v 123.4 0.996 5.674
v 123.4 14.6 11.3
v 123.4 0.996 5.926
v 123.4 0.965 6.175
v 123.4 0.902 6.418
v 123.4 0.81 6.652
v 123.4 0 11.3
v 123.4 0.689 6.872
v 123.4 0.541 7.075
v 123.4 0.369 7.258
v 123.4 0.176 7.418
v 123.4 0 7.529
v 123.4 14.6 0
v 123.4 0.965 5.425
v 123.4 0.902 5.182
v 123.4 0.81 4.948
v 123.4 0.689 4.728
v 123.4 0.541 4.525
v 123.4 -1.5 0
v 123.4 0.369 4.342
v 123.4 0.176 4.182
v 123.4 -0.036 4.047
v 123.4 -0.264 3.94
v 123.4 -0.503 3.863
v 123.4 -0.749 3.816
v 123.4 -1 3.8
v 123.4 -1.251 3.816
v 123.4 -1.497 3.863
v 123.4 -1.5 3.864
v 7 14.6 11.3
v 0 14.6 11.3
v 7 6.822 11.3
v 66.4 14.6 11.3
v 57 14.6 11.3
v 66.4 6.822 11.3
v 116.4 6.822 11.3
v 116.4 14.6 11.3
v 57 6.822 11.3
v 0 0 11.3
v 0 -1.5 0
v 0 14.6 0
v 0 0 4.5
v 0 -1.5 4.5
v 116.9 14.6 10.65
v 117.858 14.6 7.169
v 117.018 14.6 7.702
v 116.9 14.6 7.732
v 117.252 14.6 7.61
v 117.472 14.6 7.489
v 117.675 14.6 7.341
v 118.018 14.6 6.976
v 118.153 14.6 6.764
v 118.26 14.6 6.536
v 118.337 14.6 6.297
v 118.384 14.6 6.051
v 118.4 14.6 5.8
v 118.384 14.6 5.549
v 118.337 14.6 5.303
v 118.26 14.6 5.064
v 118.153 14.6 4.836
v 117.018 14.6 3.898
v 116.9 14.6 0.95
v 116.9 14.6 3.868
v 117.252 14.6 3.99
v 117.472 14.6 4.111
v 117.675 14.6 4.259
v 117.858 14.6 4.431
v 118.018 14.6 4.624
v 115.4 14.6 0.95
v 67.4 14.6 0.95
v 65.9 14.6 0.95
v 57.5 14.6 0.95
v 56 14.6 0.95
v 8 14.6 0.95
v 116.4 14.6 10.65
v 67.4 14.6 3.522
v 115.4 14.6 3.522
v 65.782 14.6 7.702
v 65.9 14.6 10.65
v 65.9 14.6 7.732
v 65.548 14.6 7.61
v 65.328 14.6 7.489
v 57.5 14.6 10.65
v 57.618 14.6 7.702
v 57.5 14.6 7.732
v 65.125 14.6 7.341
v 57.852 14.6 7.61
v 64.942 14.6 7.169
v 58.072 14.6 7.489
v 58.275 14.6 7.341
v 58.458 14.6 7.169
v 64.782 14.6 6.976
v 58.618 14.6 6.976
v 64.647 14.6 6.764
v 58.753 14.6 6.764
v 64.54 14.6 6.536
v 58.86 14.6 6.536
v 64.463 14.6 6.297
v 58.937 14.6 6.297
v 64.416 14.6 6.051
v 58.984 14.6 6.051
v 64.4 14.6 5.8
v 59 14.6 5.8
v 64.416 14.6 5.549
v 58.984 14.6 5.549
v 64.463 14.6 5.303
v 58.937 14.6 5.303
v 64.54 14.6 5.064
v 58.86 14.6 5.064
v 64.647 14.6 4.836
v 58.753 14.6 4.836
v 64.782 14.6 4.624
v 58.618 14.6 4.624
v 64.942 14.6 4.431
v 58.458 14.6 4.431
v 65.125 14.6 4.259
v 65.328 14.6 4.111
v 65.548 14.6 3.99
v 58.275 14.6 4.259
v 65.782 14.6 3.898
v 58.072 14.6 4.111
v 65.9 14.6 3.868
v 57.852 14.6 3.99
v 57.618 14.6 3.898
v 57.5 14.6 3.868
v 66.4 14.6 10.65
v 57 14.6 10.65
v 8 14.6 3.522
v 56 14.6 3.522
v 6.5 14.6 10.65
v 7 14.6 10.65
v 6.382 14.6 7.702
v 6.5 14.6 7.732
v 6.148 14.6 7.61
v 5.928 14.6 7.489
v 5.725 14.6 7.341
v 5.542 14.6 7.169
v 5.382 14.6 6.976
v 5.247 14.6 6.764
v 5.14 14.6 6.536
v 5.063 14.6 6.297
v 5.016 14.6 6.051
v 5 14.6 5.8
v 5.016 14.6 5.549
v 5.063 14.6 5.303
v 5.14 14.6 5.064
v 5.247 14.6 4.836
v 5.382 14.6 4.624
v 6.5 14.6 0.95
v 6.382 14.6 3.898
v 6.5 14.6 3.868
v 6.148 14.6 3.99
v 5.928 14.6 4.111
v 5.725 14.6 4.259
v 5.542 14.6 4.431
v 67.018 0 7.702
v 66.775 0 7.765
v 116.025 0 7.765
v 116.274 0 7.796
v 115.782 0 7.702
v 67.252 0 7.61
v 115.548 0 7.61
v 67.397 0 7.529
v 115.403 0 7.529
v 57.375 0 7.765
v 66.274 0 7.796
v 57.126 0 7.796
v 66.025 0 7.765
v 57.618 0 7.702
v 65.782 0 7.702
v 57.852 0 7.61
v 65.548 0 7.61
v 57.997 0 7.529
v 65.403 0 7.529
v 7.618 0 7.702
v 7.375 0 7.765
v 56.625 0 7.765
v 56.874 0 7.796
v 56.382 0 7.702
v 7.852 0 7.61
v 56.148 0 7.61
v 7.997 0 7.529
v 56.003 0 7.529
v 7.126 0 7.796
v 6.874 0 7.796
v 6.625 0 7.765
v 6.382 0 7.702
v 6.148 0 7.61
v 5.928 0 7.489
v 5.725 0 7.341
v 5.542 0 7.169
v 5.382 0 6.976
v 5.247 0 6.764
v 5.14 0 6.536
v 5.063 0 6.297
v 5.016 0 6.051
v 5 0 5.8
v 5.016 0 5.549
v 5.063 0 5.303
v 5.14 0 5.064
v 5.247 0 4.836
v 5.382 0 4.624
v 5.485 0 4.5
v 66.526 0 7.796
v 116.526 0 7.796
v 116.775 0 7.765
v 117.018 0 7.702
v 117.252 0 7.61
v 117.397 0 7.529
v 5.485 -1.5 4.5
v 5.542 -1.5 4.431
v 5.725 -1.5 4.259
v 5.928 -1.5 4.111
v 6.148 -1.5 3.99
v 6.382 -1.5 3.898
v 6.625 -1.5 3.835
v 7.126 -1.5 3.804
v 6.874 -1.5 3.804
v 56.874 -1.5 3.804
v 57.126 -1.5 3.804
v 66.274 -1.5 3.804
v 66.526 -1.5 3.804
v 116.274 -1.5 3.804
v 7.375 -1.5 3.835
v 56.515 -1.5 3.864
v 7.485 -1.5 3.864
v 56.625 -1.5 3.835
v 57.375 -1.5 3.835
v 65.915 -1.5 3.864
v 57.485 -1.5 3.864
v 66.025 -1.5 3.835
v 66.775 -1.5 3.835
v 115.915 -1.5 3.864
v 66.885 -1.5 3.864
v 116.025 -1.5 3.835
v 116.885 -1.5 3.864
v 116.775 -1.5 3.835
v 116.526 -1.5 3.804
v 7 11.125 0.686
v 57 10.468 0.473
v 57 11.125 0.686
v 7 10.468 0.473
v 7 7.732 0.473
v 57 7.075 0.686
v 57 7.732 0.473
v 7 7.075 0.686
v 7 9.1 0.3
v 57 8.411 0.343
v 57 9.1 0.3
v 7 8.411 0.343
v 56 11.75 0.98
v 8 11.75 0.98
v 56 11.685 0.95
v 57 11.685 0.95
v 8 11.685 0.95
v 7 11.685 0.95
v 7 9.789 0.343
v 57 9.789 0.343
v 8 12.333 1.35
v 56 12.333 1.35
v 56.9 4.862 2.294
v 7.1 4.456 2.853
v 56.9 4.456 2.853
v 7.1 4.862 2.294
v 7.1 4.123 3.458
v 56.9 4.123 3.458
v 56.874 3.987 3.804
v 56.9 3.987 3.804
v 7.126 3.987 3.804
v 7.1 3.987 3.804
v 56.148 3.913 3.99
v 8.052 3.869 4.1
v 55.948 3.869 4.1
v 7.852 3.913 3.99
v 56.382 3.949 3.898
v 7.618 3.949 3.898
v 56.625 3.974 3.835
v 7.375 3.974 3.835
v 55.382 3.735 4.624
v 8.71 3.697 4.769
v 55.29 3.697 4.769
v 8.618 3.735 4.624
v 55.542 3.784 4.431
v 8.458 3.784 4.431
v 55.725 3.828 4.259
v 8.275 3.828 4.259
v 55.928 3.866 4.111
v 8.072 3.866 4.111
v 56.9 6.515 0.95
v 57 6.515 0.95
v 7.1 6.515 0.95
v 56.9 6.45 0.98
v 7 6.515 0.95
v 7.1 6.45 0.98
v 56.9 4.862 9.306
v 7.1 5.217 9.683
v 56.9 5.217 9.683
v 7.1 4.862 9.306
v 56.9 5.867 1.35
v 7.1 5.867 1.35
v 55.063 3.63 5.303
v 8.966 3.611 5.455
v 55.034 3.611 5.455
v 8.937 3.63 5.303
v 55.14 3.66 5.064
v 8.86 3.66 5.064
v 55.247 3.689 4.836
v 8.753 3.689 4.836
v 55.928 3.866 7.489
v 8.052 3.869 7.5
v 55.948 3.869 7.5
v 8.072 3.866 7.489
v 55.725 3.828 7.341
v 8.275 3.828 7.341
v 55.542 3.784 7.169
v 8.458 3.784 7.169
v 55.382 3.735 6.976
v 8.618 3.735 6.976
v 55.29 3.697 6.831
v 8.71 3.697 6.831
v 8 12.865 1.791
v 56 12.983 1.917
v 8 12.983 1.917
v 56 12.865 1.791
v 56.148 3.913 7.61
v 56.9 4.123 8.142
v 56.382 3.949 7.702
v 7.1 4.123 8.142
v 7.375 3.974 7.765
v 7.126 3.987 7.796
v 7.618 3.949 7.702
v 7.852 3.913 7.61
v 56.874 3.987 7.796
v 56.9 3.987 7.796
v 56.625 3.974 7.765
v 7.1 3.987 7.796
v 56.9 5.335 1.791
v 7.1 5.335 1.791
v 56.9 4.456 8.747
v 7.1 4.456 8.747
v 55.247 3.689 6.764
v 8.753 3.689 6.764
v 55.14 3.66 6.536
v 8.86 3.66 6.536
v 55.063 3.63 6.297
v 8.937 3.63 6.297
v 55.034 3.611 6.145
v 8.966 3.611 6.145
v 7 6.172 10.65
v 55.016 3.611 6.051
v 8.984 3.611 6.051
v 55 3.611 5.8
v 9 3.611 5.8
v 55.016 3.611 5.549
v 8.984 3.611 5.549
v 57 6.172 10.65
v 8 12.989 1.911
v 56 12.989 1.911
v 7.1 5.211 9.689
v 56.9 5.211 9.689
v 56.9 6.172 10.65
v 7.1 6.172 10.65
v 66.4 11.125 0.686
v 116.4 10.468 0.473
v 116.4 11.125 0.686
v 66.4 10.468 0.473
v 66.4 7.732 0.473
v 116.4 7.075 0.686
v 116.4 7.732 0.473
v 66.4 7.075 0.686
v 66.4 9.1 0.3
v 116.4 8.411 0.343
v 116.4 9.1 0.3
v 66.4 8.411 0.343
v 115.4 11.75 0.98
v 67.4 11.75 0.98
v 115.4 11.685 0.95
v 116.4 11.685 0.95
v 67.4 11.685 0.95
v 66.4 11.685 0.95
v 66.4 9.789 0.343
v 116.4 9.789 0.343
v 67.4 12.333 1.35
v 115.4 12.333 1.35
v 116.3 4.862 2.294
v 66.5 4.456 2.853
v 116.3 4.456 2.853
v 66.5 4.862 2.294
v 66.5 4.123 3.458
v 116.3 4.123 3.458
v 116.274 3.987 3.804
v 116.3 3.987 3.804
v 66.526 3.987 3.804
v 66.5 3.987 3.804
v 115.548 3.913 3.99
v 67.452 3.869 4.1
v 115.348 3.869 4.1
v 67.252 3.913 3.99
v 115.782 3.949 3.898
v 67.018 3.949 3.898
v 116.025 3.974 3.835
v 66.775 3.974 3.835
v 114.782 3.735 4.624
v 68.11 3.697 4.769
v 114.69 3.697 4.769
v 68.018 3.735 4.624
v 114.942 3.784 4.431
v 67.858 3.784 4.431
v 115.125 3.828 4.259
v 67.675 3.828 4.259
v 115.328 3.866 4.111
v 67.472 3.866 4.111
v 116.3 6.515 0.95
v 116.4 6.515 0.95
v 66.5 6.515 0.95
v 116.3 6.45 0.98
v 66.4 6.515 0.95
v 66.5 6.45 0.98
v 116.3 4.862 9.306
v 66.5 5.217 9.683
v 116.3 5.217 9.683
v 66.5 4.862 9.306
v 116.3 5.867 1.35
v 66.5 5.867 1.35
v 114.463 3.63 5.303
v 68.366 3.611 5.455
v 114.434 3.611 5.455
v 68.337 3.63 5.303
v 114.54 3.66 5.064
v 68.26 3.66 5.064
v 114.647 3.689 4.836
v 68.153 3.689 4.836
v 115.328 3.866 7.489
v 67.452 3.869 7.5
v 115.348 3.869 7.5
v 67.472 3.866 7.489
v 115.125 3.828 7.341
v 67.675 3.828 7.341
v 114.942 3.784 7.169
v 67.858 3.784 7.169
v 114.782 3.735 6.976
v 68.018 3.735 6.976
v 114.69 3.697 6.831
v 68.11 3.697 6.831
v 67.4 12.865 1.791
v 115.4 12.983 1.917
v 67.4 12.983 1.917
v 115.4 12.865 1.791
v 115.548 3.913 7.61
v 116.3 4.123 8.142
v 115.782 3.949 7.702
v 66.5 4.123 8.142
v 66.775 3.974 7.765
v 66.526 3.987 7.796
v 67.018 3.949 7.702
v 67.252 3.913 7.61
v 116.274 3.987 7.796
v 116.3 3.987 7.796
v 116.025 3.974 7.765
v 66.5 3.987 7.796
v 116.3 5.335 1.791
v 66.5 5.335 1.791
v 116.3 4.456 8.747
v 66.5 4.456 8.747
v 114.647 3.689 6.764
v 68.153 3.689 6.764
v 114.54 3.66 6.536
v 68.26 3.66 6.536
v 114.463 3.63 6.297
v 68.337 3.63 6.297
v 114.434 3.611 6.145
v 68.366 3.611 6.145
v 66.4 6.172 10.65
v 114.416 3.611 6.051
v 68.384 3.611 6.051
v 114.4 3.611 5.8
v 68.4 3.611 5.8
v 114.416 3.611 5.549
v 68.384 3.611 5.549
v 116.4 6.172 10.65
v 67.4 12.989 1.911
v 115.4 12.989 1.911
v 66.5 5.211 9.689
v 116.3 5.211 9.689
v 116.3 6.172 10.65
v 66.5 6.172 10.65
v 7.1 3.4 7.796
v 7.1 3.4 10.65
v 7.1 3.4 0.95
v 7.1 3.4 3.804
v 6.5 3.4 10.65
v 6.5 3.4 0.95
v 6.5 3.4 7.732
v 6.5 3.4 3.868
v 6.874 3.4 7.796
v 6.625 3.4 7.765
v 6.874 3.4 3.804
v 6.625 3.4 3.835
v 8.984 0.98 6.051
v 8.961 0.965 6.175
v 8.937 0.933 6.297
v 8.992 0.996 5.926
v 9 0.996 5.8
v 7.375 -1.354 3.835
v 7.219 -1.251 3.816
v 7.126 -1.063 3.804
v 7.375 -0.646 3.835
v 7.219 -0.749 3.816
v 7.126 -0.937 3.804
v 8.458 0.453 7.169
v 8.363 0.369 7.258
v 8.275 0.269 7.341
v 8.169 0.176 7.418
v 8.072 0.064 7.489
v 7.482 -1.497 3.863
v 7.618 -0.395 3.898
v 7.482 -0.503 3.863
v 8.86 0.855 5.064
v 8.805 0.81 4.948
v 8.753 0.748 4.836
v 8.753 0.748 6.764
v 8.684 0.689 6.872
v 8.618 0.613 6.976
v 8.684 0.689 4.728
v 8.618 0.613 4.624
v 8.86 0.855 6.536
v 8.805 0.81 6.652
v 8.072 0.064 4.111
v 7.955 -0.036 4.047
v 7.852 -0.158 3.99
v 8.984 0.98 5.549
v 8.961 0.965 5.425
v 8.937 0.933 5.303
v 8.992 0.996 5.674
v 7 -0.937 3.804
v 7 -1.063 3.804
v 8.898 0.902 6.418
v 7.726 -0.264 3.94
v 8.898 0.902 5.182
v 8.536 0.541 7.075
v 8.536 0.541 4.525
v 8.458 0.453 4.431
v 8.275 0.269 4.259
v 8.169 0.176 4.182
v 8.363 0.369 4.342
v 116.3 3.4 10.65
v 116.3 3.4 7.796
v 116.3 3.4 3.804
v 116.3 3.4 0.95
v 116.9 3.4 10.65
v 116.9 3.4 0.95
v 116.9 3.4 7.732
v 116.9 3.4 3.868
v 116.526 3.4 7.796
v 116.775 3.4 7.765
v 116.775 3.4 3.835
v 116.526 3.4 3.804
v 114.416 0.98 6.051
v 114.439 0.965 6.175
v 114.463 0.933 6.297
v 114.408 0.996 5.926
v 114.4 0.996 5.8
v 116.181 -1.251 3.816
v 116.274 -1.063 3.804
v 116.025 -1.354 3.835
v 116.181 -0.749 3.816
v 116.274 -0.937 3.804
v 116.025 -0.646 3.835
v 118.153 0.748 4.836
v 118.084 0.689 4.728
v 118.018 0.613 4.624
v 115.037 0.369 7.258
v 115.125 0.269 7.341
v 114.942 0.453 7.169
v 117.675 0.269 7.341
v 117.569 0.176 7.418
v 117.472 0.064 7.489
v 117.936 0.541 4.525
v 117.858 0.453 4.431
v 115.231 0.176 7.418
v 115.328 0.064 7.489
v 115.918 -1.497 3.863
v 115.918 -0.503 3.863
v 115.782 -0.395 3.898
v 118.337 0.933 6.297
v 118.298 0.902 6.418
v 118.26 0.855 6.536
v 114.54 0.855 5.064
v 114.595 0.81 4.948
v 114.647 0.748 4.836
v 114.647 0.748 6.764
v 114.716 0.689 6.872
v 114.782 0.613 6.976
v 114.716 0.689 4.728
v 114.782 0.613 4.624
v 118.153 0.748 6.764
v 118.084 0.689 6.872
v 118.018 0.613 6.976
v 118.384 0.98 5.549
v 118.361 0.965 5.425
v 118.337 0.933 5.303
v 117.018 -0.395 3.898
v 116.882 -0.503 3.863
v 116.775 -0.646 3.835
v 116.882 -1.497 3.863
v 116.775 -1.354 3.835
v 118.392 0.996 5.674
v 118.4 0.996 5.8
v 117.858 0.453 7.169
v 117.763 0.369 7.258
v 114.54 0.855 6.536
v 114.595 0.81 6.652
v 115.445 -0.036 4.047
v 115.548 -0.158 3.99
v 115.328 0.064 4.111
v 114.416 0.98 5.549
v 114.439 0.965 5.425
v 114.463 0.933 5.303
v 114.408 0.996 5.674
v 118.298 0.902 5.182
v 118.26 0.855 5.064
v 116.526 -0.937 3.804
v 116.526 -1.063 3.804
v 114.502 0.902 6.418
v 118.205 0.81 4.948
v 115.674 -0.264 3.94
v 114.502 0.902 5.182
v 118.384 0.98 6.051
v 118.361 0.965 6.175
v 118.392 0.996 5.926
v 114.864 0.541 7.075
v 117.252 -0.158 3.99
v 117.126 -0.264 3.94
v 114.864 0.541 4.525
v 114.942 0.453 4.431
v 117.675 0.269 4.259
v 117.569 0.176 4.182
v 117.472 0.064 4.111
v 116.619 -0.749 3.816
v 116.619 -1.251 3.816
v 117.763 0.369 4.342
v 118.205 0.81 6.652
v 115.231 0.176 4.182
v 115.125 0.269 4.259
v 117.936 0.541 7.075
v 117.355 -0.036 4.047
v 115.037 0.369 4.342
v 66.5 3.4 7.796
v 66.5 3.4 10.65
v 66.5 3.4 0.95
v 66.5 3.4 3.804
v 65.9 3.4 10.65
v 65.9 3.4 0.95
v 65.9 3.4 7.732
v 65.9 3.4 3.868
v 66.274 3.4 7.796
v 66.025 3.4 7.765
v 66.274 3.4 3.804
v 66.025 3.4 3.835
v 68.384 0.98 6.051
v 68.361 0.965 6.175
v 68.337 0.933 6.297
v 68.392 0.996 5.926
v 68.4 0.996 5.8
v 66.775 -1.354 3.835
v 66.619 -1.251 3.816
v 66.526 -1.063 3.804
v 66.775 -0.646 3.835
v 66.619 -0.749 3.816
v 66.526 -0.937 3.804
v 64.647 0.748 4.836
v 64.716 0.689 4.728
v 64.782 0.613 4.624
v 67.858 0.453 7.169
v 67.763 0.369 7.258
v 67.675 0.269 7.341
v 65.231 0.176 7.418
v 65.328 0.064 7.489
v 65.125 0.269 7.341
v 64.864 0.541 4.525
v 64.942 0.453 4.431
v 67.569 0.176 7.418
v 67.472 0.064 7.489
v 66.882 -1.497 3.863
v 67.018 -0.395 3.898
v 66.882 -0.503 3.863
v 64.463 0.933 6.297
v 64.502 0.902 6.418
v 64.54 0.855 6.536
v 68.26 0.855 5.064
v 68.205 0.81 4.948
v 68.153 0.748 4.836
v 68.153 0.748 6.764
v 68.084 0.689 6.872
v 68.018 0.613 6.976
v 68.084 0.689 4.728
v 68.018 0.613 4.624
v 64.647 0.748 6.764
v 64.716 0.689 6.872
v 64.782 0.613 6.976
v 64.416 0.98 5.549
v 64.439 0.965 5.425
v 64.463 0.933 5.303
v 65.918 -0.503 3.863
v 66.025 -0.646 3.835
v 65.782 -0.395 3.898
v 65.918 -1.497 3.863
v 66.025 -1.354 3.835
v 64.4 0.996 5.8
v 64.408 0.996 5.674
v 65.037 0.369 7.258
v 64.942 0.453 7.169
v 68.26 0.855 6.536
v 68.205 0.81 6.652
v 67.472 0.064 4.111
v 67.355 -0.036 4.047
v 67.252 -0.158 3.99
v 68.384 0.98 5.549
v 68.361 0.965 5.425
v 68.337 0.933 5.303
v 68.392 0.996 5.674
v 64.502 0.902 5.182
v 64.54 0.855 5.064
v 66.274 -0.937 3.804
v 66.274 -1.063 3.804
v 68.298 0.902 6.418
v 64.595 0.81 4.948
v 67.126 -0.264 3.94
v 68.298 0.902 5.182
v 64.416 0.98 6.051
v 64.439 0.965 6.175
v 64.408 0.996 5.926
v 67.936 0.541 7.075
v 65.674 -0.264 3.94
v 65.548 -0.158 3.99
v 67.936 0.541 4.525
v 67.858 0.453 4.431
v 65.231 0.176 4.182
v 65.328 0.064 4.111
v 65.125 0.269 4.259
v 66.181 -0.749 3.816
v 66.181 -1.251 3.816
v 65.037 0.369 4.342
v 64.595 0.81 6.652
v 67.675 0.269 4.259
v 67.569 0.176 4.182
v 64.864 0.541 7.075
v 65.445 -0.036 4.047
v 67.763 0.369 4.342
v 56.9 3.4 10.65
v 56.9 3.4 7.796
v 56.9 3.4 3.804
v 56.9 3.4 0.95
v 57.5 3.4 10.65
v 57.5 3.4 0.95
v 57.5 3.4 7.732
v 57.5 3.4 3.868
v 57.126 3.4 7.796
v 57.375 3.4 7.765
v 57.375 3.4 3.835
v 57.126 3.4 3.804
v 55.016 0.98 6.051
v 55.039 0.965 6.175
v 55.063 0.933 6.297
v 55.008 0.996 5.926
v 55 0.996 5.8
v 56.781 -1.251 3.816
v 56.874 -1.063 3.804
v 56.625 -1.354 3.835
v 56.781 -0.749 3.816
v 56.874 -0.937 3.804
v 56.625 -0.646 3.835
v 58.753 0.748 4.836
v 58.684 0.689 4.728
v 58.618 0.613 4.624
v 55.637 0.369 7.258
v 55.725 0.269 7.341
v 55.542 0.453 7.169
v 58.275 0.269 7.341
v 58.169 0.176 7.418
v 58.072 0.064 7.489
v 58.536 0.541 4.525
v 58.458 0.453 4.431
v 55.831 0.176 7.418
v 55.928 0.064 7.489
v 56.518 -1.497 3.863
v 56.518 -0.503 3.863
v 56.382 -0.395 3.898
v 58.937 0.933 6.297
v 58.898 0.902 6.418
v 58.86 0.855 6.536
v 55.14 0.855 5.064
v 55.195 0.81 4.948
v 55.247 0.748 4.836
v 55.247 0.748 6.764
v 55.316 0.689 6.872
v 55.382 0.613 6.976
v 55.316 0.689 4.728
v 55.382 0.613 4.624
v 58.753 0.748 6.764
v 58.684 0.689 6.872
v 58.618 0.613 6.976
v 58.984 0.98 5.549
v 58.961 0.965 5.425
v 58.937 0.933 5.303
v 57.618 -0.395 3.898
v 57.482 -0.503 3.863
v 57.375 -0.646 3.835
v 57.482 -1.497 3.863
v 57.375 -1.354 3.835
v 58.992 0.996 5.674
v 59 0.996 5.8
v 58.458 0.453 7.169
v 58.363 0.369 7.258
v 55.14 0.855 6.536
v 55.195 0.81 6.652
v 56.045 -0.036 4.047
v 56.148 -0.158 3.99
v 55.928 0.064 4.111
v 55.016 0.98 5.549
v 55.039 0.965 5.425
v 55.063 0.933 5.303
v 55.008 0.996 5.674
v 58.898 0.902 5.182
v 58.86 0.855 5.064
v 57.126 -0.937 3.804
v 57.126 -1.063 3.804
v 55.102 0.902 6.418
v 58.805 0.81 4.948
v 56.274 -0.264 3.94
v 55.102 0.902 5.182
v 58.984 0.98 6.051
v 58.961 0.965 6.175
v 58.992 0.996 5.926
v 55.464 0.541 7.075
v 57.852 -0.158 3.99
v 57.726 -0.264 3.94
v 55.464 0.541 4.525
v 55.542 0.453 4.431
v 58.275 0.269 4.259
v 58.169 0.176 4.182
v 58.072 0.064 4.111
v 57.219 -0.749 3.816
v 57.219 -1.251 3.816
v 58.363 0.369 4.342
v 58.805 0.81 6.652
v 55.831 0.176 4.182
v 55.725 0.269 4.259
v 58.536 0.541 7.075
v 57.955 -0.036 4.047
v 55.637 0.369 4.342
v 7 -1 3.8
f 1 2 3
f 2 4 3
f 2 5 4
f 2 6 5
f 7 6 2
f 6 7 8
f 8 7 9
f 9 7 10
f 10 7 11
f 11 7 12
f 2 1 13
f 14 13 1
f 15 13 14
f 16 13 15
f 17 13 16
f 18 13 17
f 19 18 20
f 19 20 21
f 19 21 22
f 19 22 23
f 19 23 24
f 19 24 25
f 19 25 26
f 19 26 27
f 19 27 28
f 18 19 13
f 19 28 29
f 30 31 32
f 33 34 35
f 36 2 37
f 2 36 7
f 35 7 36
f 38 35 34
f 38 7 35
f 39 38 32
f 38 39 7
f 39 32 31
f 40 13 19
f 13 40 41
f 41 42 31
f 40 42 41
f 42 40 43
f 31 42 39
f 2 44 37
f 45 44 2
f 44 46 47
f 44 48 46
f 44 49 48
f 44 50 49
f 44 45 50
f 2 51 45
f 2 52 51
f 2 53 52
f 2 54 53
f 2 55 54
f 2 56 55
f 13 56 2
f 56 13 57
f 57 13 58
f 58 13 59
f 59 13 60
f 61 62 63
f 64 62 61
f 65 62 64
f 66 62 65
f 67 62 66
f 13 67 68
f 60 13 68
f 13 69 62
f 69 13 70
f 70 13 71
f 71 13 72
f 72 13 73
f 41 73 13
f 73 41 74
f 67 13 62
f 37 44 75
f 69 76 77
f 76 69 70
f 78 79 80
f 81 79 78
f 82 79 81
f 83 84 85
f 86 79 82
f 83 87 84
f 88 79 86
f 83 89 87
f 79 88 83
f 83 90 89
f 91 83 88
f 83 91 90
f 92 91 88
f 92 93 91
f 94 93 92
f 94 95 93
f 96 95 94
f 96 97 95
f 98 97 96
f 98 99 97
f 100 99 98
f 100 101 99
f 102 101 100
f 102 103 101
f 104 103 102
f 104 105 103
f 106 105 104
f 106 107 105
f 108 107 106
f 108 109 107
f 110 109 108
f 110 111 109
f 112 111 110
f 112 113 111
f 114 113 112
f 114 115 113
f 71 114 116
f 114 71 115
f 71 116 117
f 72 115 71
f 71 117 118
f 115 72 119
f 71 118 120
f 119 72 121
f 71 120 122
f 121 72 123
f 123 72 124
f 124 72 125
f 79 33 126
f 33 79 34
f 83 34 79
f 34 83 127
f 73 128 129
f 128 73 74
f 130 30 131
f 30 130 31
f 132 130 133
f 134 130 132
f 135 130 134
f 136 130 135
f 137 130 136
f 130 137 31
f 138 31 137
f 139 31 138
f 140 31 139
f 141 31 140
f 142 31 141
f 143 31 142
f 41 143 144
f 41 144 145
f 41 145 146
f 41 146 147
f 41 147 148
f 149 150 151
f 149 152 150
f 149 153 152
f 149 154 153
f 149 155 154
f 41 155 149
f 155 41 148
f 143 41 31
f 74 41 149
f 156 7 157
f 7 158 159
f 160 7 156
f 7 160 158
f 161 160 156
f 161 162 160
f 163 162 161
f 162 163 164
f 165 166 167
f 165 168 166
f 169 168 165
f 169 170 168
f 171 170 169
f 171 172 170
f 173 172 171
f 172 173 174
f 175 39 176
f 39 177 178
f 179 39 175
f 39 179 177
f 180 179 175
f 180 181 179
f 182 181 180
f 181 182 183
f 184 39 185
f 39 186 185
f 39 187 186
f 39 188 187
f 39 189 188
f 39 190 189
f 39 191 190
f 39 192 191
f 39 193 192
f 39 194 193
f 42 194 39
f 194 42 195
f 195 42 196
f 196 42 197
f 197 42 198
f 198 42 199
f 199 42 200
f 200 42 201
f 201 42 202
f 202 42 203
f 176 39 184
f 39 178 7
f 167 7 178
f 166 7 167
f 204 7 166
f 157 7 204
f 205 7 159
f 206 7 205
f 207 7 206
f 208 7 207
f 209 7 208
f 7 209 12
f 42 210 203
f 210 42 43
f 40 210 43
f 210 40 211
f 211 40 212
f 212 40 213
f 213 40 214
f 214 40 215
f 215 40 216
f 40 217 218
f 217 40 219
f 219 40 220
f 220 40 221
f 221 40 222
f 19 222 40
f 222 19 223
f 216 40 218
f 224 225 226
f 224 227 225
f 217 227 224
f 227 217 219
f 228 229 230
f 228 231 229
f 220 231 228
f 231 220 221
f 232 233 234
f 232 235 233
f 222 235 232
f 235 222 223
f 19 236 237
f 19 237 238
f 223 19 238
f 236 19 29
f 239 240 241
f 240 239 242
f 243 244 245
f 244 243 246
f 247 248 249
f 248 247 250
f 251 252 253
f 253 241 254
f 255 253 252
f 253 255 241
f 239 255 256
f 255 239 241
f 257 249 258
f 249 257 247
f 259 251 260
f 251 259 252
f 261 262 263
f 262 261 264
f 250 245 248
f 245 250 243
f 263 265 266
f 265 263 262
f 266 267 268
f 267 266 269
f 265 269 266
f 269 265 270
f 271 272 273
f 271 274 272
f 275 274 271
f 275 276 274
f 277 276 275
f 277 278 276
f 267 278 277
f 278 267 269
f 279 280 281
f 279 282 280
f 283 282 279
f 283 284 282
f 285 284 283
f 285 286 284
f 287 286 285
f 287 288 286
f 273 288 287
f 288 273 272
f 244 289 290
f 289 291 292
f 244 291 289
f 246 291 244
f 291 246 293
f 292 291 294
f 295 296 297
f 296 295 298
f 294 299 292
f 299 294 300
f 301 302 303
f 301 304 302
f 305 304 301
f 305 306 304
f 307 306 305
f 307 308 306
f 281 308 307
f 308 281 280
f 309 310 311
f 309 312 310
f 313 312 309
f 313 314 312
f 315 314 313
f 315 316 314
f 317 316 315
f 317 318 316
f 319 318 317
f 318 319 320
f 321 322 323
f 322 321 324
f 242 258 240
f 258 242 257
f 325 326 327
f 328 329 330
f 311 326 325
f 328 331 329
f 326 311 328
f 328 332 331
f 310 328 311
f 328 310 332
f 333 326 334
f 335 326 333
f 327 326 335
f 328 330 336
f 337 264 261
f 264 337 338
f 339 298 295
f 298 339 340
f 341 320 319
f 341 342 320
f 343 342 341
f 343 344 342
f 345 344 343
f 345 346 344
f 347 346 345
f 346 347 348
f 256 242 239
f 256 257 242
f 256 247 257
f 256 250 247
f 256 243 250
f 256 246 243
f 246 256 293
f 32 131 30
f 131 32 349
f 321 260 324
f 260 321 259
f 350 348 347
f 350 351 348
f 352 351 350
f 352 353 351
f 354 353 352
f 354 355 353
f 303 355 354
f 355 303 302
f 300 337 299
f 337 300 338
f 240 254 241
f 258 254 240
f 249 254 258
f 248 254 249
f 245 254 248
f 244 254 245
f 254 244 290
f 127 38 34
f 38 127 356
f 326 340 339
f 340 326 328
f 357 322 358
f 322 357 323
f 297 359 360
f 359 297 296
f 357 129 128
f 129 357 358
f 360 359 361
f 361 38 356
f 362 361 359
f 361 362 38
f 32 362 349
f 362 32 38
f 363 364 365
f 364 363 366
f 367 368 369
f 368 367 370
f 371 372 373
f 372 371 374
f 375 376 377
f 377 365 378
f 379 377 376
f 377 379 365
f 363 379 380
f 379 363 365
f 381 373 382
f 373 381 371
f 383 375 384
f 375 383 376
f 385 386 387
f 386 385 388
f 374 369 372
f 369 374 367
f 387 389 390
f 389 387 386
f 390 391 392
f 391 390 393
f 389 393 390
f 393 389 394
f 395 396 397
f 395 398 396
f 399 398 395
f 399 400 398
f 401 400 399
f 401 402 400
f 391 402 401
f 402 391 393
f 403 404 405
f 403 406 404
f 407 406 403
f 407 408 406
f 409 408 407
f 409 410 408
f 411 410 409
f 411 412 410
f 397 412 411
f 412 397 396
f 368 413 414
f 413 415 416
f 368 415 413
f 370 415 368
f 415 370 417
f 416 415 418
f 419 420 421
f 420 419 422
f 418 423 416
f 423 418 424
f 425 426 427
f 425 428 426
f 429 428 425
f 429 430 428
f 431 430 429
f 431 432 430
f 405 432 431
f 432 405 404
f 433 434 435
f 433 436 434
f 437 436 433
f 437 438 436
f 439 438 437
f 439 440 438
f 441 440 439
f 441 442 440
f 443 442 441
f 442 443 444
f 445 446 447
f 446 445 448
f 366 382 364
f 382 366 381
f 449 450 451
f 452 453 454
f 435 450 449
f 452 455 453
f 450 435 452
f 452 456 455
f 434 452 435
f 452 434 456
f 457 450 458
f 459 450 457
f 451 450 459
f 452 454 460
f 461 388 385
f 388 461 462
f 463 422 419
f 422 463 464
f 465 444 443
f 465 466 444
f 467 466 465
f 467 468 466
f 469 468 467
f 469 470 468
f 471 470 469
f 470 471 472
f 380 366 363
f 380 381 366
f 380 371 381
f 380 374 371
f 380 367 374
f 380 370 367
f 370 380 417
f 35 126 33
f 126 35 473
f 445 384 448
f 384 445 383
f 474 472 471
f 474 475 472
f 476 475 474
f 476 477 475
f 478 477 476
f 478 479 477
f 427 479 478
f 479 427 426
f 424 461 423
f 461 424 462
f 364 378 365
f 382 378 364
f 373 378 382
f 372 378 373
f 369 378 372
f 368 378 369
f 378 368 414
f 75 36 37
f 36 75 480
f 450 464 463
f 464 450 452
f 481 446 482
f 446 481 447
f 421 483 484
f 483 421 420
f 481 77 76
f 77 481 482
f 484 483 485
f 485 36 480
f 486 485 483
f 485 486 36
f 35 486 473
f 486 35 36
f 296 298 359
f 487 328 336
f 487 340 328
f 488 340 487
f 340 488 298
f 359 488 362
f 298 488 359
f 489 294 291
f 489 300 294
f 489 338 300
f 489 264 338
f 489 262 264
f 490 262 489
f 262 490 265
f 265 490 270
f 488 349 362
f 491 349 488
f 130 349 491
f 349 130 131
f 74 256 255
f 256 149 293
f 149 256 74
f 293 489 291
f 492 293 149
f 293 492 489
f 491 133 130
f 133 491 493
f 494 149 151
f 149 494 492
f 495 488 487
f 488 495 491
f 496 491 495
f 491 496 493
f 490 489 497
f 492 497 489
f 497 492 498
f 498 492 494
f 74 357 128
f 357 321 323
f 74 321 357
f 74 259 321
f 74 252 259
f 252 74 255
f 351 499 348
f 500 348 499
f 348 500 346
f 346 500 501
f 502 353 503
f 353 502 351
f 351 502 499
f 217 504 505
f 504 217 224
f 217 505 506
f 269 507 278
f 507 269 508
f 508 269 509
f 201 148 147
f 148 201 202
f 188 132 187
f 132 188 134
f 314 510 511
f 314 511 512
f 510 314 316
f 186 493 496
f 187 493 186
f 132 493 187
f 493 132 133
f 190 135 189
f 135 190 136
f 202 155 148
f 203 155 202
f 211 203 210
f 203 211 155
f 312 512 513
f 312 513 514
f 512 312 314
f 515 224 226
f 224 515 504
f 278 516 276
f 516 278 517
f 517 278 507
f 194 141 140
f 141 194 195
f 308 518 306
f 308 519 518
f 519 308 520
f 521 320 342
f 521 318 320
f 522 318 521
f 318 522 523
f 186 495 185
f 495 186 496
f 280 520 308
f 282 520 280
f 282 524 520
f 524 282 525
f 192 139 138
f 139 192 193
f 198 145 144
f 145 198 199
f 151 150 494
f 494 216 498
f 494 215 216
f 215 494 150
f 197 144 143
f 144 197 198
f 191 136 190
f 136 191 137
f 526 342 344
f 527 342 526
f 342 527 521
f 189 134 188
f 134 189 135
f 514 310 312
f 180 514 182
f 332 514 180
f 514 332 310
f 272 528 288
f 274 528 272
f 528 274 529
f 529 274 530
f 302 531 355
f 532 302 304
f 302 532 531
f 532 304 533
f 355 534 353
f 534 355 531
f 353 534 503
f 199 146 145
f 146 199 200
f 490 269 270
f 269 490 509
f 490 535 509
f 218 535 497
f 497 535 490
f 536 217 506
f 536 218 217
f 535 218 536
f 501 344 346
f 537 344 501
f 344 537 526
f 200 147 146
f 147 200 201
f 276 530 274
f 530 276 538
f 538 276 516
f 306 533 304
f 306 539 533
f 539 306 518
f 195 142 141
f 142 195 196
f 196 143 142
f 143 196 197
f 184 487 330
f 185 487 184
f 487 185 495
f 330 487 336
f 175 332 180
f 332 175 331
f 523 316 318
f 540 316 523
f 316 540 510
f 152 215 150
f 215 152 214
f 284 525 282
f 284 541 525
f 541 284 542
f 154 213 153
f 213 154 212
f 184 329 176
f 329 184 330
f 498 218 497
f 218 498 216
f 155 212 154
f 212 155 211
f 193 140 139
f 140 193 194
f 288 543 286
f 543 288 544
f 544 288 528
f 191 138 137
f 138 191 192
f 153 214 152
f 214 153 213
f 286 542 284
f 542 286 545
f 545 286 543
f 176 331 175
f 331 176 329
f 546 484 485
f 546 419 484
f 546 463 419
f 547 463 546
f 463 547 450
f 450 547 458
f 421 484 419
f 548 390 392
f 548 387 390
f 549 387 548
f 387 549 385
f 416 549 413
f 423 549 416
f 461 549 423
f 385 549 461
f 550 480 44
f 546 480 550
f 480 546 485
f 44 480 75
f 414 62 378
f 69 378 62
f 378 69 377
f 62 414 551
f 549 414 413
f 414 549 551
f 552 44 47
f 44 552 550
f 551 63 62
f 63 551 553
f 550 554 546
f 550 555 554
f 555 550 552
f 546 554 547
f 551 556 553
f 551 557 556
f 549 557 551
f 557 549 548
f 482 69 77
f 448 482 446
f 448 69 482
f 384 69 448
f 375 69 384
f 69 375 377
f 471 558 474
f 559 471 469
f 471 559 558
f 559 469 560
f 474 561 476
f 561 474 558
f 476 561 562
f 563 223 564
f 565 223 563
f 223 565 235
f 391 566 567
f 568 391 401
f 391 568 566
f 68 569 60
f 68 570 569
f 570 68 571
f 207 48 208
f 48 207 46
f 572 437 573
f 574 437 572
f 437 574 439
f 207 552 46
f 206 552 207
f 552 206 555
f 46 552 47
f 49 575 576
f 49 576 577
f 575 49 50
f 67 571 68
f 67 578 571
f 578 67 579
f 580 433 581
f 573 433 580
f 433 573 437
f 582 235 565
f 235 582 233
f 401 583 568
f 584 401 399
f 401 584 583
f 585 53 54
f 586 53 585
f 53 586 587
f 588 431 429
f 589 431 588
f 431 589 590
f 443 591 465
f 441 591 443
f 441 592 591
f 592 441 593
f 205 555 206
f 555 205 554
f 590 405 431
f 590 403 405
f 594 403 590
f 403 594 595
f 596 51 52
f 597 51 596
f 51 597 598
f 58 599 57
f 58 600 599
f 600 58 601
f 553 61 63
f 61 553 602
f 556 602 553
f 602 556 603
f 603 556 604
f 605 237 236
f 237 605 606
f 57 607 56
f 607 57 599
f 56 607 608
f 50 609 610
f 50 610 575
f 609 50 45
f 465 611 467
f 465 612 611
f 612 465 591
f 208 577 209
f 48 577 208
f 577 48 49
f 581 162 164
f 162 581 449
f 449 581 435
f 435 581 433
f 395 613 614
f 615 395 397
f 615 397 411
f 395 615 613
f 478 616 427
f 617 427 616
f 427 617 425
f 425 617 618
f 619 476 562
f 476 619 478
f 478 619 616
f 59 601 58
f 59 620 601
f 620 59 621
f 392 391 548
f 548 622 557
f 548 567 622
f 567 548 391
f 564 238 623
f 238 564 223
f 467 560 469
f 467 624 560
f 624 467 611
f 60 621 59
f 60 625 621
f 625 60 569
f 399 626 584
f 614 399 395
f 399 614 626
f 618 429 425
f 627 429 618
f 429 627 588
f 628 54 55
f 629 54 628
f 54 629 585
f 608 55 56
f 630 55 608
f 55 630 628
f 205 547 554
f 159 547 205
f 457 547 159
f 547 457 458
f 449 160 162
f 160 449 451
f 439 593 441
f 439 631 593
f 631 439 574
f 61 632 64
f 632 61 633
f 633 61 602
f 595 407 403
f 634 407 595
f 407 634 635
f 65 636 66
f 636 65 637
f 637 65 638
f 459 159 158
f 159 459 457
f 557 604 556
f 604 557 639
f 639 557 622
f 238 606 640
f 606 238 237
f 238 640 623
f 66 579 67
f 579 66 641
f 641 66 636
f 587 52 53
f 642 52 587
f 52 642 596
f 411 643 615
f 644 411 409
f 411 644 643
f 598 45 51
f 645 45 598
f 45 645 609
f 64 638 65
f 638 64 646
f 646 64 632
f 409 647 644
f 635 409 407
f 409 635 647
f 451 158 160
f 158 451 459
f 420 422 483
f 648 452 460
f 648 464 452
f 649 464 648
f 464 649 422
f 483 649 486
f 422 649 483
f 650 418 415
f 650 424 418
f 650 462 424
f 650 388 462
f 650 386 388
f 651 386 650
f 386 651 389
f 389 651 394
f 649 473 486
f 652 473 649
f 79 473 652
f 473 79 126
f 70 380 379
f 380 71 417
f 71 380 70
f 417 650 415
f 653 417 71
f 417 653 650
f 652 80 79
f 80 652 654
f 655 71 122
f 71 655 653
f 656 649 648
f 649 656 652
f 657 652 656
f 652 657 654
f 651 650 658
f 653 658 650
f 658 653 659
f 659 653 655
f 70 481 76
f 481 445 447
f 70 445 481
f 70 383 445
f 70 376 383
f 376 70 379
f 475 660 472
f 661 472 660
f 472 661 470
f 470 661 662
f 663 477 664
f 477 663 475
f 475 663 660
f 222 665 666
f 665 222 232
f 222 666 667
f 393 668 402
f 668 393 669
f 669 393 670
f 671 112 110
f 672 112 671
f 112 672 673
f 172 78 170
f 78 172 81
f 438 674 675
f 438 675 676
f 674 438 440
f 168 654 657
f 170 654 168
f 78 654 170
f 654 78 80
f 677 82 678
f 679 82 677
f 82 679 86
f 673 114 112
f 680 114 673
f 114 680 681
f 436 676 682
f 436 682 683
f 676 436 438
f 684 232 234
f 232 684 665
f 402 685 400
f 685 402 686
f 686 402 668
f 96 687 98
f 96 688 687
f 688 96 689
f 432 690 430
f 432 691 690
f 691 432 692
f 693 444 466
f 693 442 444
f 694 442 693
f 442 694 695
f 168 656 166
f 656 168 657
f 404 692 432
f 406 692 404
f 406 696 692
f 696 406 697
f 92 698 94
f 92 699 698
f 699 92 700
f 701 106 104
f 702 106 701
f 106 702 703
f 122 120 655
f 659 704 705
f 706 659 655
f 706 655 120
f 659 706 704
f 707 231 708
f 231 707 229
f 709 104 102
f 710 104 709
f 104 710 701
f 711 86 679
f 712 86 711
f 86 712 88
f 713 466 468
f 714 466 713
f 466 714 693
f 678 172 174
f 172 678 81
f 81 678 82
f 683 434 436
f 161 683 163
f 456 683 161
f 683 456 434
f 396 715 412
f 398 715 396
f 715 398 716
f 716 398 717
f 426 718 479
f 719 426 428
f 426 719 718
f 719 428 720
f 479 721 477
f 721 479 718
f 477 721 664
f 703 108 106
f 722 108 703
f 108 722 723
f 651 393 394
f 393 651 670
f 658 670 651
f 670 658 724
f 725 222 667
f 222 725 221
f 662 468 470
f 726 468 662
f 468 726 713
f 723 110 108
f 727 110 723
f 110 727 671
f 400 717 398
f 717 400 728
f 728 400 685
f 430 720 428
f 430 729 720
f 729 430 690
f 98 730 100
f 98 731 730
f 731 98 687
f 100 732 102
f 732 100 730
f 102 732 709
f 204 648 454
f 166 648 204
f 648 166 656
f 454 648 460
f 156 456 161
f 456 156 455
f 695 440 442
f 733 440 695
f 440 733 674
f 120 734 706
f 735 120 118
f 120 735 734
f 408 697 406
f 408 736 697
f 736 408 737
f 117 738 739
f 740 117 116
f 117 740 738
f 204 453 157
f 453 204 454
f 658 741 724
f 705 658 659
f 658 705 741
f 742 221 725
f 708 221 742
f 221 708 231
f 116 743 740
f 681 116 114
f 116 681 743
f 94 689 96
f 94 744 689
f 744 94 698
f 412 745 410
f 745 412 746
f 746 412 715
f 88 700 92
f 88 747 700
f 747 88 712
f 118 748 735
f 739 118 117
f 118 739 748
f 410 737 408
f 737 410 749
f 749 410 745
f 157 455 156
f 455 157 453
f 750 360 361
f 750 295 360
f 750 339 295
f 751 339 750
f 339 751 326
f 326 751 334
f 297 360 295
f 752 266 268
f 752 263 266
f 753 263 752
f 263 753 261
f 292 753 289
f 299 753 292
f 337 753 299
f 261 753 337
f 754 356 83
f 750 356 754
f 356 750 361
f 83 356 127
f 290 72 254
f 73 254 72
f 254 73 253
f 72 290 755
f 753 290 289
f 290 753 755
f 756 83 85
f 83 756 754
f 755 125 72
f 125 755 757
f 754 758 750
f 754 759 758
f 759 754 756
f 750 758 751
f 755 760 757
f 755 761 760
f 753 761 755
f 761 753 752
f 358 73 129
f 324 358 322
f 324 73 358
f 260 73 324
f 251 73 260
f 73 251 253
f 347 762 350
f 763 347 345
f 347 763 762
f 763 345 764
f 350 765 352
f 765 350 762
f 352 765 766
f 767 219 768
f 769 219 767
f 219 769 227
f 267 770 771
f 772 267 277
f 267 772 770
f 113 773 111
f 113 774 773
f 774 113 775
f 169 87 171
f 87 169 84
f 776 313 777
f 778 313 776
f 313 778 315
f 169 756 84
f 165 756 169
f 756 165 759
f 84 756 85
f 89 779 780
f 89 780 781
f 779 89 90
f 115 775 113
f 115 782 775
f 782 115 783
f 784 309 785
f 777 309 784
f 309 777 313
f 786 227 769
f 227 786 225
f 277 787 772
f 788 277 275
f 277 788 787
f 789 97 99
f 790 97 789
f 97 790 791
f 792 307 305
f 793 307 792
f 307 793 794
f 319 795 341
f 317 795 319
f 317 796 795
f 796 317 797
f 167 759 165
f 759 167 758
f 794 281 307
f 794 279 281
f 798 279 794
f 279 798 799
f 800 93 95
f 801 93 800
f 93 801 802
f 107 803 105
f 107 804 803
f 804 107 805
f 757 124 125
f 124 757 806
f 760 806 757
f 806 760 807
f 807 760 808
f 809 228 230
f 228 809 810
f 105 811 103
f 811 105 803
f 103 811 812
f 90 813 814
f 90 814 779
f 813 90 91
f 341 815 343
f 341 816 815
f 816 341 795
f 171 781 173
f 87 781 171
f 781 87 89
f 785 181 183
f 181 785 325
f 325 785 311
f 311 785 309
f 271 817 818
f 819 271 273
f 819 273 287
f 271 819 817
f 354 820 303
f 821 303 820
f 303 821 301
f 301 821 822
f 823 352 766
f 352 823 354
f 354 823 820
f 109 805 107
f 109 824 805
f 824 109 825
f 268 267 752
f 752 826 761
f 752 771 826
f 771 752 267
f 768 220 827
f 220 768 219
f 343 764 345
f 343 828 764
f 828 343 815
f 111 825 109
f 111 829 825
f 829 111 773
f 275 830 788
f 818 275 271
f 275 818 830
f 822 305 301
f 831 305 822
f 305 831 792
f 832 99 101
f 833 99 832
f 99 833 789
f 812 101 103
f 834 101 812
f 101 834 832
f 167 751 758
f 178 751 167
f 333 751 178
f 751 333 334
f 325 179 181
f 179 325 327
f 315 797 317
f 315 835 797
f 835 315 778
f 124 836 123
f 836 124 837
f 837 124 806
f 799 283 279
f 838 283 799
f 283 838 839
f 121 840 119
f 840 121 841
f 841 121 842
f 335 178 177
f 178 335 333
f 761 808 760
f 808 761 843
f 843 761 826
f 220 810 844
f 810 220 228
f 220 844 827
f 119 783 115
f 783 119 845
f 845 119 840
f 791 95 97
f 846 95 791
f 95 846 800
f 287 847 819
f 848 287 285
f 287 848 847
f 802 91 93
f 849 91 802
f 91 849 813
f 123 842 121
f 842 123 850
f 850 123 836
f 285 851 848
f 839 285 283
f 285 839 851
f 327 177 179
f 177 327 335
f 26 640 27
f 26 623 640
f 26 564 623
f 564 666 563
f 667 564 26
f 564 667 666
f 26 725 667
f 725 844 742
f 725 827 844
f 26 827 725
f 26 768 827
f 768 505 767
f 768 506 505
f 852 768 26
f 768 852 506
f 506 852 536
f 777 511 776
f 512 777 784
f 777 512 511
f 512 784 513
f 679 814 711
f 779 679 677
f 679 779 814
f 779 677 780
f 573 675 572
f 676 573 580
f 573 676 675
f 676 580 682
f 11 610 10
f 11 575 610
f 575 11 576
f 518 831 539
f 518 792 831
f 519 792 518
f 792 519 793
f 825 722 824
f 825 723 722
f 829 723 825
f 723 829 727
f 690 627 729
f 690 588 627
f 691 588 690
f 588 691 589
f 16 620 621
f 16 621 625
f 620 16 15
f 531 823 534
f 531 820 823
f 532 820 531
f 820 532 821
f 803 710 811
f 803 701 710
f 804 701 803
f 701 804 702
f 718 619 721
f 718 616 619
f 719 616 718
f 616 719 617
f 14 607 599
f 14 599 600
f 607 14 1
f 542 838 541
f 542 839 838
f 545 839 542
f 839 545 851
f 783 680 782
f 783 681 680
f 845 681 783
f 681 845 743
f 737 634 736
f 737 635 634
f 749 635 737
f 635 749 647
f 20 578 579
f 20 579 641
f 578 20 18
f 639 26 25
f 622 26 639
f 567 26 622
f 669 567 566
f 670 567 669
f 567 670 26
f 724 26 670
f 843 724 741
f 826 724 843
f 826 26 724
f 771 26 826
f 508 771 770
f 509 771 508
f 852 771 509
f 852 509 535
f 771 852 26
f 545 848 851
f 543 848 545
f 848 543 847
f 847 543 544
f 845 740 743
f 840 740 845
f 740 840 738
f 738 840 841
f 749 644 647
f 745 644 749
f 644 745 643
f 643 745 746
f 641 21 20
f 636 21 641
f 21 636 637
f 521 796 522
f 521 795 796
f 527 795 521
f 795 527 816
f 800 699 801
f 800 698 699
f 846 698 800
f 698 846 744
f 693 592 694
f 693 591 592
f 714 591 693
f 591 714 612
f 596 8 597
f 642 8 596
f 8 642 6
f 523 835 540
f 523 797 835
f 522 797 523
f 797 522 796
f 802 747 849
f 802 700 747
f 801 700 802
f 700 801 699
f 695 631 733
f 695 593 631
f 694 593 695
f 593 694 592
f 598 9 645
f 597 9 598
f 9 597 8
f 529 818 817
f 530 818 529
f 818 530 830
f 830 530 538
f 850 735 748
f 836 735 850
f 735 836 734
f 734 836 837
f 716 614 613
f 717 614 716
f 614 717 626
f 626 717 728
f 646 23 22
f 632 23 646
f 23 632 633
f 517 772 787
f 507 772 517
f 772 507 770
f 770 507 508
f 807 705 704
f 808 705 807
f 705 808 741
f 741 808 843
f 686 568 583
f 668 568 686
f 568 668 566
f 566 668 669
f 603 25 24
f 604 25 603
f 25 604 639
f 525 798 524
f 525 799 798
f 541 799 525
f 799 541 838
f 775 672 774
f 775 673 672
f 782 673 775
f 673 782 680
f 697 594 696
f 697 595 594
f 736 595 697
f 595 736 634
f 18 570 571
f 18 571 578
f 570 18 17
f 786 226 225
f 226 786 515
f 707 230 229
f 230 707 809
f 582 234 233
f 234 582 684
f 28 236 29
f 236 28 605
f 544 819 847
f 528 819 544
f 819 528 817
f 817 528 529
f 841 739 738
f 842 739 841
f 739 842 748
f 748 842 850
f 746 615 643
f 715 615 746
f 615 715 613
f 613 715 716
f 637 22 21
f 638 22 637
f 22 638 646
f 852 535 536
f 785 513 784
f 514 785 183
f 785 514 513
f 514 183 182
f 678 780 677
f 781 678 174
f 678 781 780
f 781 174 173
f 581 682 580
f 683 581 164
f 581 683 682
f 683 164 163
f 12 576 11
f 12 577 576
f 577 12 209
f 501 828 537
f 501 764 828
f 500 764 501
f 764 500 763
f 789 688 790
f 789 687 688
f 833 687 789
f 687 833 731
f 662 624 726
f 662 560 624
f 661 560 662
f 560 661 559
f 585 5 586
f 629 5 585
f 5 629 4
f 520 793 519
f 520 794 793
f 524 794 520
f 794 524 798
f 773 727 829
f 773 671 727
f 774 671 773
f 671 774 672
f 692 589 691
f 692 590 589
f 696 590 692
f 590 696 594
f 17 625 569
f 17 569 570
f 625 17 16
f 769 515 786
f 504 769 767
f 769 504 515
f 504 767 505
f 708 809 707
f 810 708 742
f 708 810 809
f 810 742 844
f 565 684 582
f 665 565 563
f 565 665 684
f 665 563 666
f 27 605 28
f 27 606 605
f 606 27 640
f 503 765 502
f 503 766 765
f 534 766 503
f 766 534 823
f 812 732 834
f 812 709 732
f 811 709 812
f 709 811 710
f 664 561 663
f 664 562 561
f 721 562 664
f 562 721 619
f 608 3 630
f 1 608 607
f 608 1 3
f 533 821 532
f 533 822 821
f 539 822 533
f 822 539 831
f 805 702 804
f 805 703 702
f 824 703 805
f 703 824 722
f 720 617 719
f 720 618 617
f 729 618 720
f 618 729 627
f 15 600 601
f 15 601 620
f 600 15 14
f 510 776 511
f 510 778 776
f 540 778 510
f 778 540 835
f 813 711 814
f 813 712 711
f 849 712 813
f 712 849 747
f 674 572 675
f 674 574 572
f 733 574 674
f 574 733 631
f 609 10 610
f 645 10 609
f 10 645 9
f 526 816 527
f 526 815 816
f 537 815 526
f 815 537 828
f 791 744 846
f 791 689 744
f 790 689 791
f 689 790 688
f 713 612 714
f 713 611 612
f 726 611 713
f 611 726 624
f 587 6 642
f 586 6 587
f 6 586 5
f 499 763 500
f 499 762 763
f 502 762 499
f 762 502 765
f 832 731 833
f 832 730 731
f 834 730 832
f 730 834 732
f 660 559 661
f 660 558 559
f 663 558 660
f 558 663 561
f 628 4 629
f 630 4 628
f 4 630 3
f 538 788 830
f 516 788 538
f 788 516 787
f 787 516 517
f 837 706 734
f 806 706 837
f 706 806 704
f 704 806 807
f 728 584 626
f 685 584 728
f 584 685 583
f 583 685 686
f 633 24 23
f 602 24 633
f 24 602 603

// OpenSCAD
$fn = 50;

width = 123.4;
height = 16.3 - 5.0;
depth = 14.6;
depth_to_pcb = 16.1;
height_to_pcb = 4.5;

aa_dia = 11;
aa_length = 44.5;
contact_length = 50.0 - aa_length;

module battery_with_insertion_path() {
    union() {
        rotate([0, 90, 0])
            cylinder(h=aa_length + contact_length, d = aa_dia);
        rotate([-45, 0, 0])
            translate([0, -aa_dia / 2, 0])
            cube([aa_length + contact_length, aa_dia, 100]);
    }
}

module contact() {
    /*rotate([180, 0, 0])
        union() {
            translate([-0.5, -4.7, -9.3/2])
                cube([0.8, 10.5, 9.3]);
            translate([-0.5, -4.7, -3.0/2])
                cube([0.6, 17, 3.0]);
        }*/
    translate([-0.5, -5.7, -9.7/2])
        cube([0.6, 30, 9.7]);
    translate([-0.5, -1, -9.7/2])
        cube([1.5, 25, 3]);
    rotate([90, 0, 0])
        cylinder(h=50, d=4, center=true);
}

difference() {
    // Start with a simple block as well as an extensinn towards the PCB.
    union() {
        cube([width, depth, height]);
        translate([0, depth - depth_to_pcb, 0])
            cube([width, depth_to_pcb, height_to_pcb]);
    }

    // Reserve space for two batteries, with a sufficiently large hole to insert the batteries.
    translate([7, depth - aa_dia / 2, height - aa_dia / 2])
        battery_with_insertion_path();
    translate([width - 7 - aa_length - contact_length, depth - aa_dia / 2, height - aa_dia / 2])
        battery_with_insertion_path();

    // Reserve space for the contacts, suitable for heat insertion.
    translate([7, depth - aa_dia / 2, height - aa_dia / 2])
        contact();
    translate([width - 7, depth - aa_dia / 2, height - aa_dia / 2])
        scale([-1, 1, 1])
        contact();
    translate([width - 7 - aa_length - contact_length, depth - aa_dia / 2, height - aa_dia / 2])
        contact();
    translate([7 + aa_length + contact_length, depth - aa_dia / 2, height - aa_dia / 2])
        scale([-1, 1, 1])
        contact();

    // Reserve space to run the cables along the part.
    translate([7, -1, height - aa_dia / 2])
        rotate([0, 90, 0])
        cylinder(d=4, h=width);
}
